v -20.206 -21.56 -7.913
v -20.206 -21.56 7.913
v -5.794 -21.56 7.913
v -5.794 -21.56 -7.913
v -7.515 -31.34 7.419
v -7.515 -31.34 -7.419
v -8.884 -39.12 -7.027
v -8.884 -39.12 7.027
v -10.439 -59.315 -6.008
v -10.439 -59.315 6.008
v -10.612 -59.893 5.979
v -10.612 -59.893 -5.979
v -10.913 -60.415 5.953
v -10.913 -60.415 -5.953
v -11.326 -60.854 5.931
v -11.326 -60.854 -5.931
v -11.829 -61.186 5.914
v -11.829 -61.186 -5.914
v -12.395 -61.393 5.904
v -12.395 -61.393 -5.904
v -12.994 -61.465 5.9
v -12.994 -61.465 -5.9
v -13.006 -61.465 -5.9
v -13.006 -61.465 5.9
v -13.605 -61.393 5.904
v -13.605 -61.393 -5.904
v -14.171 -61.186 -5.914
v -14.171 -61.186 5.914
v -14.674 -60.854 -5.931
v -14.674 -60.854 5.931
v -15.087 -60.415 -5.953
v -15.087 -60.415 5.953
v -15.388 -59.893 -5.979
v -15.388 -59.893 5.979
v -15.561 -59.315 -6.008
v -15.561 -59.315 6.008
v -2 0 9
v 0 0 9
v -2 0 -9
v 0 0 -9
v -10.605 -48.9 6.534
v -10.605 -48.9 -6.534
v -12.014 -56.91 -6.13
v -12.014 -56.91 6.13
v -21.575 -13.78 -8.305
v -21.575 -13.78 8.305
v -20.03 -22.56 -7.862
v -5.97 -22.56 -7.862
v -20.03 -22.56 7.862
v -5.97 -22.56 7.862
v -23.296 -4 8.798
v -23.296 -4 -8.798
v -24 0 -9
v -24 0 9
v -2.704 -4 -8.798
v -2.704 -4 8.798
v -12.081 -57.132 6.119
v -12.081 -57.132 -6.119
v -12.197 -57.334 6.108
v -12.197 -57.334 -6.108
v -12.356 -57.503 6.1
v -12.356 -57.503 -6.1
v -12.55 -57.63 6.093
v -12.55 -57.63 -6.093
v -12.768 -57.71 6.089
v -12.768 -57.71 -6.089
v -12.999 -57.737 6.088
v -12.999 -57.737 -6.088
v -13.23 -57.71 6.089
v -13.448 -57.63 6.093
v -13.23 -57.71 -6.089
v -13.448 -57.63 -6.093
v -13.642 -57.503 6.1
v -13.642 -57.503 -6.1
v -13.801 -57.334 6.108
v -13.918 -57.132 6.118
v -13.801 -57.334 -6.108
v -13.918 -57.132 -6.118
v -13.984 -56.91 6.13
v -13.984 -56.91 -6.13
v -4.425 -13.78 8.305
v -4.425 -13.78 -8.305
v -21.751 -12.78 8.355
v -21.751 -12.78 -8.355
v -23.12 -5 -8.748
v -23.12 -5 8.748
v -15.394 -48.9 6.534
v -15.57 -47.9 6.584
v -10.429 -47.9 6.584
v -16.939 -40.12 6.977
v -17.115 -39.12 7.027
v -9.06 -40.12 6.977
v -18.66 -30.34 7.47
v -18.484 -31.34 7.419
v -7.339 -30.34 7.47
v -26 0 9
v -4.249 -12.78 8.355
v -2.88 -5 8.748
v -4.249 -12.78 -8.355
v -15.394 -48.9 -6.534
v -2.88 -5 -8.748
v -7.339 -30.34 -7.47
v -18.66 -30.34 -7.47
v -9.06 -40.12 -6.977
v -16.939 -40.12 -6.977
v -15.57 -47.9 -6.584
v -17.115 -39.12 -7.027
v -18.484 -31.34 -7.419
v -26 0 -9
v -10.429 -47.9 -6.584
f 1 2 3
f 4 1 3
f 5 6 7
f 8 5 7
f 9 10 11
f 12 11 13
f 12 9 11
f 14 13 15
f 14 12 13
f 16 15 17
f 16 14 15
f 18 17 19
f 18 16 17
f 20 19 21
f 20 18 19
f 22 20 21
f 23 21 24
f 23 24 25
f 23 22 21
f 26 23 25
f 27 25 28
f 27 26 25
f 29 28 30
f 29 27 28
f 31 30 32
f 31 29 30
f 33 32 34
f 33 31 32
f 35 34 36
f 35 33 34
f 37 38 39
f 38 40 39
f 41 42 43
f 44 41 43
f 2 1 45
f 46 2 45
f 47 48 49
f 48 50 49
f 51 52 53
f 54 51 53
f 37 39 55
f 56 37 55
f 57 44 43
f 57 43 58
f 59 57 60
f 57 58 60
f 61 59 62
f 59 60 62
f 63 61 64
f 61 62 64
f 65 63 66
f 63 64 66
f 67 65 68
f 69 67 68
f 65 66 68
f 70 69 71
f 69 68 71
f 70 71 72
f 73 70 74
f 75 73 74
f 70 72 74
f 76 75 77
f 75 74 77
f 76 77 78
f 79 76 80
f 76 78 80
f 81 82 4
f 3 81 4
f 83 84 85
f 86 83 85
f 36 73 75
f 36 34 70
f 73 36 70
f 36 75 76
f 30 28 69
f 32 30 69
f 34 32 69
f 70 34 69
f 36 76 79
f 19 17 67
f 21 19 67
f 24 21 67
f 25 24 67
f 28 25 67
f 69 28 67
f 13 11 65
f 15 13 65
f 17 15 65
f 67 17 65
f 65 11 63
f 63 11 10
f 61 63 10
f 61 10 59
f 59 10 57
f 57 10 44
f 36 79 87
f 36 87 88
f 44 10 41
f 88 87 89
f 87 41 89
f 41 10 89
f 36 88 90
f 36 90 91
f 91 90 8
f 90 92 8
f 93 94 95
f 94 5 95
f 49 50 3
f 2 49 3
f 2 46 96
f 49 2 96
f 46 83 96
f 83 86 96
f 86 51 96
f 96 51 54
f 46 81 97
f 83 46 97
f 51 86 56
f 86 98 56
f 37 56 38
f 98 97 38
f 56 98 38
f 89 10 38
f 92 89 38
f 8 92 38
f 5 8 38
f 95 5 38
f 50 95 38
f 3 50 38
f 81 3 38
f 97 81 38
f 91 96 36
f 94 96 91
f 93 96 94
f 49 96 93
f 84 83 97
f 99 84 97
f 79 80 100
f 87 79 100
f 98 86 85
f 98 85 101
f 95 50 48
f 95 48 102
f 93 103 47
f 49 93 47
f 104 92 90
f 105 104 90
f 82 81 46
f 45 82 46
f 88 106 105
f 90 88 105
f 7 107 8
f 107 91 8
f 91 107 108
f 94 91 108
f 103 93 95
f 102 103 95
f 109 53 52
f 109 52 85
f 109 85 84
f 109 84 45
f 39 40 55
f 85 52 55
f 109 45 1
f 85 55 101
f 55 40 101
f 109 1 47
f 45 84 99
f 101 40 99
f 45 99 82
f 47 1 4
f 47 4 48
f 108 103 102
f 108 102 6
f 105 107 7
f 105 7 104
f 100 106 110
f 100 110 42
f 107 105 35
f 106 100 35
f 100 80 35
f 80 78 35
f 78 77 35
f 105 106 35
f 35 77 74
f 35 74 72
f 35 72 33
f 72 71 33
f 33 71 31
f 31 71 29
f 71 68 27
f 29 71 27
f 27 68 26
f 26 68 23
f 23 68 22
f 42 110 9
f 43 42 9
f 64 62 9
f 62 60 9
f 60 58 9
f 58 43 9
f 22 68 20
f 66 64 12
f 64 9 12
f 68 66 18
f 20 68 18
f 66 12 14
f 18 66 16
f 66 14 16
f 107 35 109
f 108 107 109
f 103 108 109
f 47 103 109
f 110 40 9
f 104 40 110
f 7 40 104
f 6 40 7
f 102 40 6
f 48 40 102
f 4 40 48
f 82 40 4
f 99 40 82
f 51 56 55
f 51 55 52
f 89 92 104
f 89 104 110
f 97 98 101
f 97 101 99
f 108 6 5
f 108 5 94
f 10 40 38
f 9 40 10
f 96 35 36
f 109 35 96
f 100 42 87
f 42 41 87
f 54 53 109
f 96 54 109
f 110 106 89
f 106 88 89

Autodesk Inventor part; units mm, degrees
ref_plane "YZ Plane" through (0, 0, 0) normal (1, 0, 0) x (0, 1, 0)
ref_plane "XZ Plane" through (0, 0, 0) normal (0, 1, 0) x (-1, 0, 0)
ref_plane "XY Plane" through (0, 0, 0) normal (0, 0, 1) x (1, 0, 0)
sketch "スケッチ1" plane through (0, 0, 0) normal (0, 0, 1) x (1, 0, 0)
  line L0 (0, 0) -> (-26, 0)
  line L1 (0, 0) -> (-13, -73.8647)
  line L2 (-13, -73.8647) -> (-26, 0)
  dimension "d0" = 26
  dimension "d1" = 75
extrude "押し出し1" add sketch "スケッチ1" along normal mid plane 18
sketch "スケッチ2" plane through (0, 0, 9) normal (0, 0, 1) x (1, 0, 0)
  line L0 (-26, 0) -> (0, 0) projected
  line L1 (-2, 0) -> (-24, 0)
  line L2 (-2, 0) -> (-12.9991, -62.5063)
  line L3 (-2, 0) -> (61.4667, 0) construction
  line L4 (-12.9991, -62.5063) -> (-24, 0)
  line L5 (-13, -73.8647) -> (-26, 0) projected
  point P0 (-15.5606, -59.3154)
  dimension "d5" = 22
  dimension "d6" = 99.98
extrude "押し出し2" cut sketch "スケッチ2" against normal blind 20
fillet "フィレット2" radius 1 1 edges at (-12.9991, -62.5063, 0)
fillet "フィレット3" radius 2.6 1 edges at (-13, -73.8647, 0)
sketch "スケッチ3" plane through (0, 0, 9) normal (0, 0, 1) x (1, 0, 0)
  line L0 (-12.0143, -56.9099) -> (-2, 0) projected
  line L1 (-2.7039, -4) -> (-23.296, -4)
  line L2 (-13.984, -56.9099) -> (-24, 0) projected
  line L3 (-23.296, -4) -> (-23.296, -5)
  line L4 (-23.296, -5) -> (-2.7039, -5)
  line L5 (-2.7039, -5) -> (-2.7039, -4)
  point P0 (0, 0)
  point P1 (-23.12, -5)
  point P2 (-2.8798, -5)
  dimension "d11" = 1
extrude "押し出し3" add sketch "スケッチ3" against normal blind 18 contours L4 L2 L1 L0
sketch "スケッチ4" plane through (0, 0, 9) normal (0, 0, 1) x (1, 0, 0)
  line L0 (-3.119, -13.78) -> (-22.8808, -13.78)
  line L1 (-22.8808, -13.78) -> (-22.8808, -12.78)
  line L2 (-22.8808, -12.78) -> (-3.119, -12.78)
  line L3 (-3.119, -12.78) -> (-3.119, -13.78)
  line L4 (-3.119, -13.78) -> (-22.8808, -12.78) construction
  line L5 (-22.8808, -13.78) -> (-3.119, -12.78) construction
  line L6 (-5.0044, -22.56) -> (-20.9954, -22.56)
  line L7 (-20.9954, -22.56) -> (-20.9954, -21.56)
  line L8 (-20.9954, -21.56) -> (-5.0044, -21.56)
  line L9 (-5.0044, -21.56) -> (-5.0044, -22.56)
  line L10 (-5.0044, -22.56) -> (-20.9954, -21.56) construction
  line L11 (-20.9954, -22.56) -> (-5.0044, -21.56) construction
  line L12 (-6.4483, -31.34) -> (-19.5515, -31.34)
  line L13 (-19.5515, -31.34) -> (-19.5515, -30.34)
  line L14 (-19.5515, -30.34) -> (-6.4483, -30.34)
  line L15 (-6.4483, -30.34) -> (-6.4483, -31.34)
  line L16 (-6.4483, -31.34) -> (-19.5515, -30.34) construction
  line L17 (-19.5515, -31.34) -> (-6.4483, -30.34) construction
  line L18 (-7.4478, -40.12) -> (-18.552, -40.12)
  line L19 (-18.552, -40.12) -> (-18.552, -39.12)
  line L20 (-18.552, -39.12) -> (-7.4478, -39.12)
  line L21 (-7.4478, -39.12) -> (-7.4478, -40.12)
  line L22 (-7.4478, -40.12) -> (-18.552, -39.12) construction
  line L23 (-18.552, -40.12) -> (-7.4478, -39.12) construction
  line L24 (-9.5376, -48.9) -> (-16.4622, -48.9)
  line L25 (-16.4622, -48.9) -> (-16.4622, -47.9)
  line L26 (-16.4622, -47.9) -> (-9.5376, -47.9)
  line L27 (-9.5376, -47.9) -> (-9.5376, -48.9)
  line L28 (-9.5376, -48.9) -> (-16.4622, -47.9) construction
  line L29 (-16.4622, -48.9) -> (-9.5376, -47.9) construction
  point P0 (0, 0)
  point P1 (-12.9999, -13.28)
  point P2 (-12.9999, -22.06)
  point P3 (-12.9999, -30.84)
  point P4 (-12.9999, -39.62)
  point P5 (-12.9999, -48.4)
  dimension "d14" = 1
  dimension "d15" = 1
  dimension "d16" = 1
  dimension "d17" = 1
  dimension "d18" = 1
extrude "押し出し4" add sketch "スケッチ4" against normal blind 18
sketch "スケッチ5" plane through (0, 0, 0) normal (1, 0, 0) x (0, 1, 0)
  line L0 (-61.4647, -9) -> (-61.4647, 9) projected
  line L1 (-61.4647, 5.9) -> (-61.4647, 9)
  line L2 (0, 9) -> (-59.3154, 9) projected
  line L3 (-61.4647, 5.9) -> (0, 9)
  line L4 (0, 9) -> (-61.4647, 9)
  line L5 (-59.3154, -9) -> (-61.4647, -9) projected
  line L6 (-61.4647, -5.9) -> (-61.4647, -9)
  line L7 (-61.4647, -9) -> (0, -9)
  line L8 (0, -9) -> (-61.4647, -5.9)
  point P0 (0, 0)
extrude "押し出し5" cut sketch "スケッチ5" against normal blind 30
properties part number "finley_gripper_60"
